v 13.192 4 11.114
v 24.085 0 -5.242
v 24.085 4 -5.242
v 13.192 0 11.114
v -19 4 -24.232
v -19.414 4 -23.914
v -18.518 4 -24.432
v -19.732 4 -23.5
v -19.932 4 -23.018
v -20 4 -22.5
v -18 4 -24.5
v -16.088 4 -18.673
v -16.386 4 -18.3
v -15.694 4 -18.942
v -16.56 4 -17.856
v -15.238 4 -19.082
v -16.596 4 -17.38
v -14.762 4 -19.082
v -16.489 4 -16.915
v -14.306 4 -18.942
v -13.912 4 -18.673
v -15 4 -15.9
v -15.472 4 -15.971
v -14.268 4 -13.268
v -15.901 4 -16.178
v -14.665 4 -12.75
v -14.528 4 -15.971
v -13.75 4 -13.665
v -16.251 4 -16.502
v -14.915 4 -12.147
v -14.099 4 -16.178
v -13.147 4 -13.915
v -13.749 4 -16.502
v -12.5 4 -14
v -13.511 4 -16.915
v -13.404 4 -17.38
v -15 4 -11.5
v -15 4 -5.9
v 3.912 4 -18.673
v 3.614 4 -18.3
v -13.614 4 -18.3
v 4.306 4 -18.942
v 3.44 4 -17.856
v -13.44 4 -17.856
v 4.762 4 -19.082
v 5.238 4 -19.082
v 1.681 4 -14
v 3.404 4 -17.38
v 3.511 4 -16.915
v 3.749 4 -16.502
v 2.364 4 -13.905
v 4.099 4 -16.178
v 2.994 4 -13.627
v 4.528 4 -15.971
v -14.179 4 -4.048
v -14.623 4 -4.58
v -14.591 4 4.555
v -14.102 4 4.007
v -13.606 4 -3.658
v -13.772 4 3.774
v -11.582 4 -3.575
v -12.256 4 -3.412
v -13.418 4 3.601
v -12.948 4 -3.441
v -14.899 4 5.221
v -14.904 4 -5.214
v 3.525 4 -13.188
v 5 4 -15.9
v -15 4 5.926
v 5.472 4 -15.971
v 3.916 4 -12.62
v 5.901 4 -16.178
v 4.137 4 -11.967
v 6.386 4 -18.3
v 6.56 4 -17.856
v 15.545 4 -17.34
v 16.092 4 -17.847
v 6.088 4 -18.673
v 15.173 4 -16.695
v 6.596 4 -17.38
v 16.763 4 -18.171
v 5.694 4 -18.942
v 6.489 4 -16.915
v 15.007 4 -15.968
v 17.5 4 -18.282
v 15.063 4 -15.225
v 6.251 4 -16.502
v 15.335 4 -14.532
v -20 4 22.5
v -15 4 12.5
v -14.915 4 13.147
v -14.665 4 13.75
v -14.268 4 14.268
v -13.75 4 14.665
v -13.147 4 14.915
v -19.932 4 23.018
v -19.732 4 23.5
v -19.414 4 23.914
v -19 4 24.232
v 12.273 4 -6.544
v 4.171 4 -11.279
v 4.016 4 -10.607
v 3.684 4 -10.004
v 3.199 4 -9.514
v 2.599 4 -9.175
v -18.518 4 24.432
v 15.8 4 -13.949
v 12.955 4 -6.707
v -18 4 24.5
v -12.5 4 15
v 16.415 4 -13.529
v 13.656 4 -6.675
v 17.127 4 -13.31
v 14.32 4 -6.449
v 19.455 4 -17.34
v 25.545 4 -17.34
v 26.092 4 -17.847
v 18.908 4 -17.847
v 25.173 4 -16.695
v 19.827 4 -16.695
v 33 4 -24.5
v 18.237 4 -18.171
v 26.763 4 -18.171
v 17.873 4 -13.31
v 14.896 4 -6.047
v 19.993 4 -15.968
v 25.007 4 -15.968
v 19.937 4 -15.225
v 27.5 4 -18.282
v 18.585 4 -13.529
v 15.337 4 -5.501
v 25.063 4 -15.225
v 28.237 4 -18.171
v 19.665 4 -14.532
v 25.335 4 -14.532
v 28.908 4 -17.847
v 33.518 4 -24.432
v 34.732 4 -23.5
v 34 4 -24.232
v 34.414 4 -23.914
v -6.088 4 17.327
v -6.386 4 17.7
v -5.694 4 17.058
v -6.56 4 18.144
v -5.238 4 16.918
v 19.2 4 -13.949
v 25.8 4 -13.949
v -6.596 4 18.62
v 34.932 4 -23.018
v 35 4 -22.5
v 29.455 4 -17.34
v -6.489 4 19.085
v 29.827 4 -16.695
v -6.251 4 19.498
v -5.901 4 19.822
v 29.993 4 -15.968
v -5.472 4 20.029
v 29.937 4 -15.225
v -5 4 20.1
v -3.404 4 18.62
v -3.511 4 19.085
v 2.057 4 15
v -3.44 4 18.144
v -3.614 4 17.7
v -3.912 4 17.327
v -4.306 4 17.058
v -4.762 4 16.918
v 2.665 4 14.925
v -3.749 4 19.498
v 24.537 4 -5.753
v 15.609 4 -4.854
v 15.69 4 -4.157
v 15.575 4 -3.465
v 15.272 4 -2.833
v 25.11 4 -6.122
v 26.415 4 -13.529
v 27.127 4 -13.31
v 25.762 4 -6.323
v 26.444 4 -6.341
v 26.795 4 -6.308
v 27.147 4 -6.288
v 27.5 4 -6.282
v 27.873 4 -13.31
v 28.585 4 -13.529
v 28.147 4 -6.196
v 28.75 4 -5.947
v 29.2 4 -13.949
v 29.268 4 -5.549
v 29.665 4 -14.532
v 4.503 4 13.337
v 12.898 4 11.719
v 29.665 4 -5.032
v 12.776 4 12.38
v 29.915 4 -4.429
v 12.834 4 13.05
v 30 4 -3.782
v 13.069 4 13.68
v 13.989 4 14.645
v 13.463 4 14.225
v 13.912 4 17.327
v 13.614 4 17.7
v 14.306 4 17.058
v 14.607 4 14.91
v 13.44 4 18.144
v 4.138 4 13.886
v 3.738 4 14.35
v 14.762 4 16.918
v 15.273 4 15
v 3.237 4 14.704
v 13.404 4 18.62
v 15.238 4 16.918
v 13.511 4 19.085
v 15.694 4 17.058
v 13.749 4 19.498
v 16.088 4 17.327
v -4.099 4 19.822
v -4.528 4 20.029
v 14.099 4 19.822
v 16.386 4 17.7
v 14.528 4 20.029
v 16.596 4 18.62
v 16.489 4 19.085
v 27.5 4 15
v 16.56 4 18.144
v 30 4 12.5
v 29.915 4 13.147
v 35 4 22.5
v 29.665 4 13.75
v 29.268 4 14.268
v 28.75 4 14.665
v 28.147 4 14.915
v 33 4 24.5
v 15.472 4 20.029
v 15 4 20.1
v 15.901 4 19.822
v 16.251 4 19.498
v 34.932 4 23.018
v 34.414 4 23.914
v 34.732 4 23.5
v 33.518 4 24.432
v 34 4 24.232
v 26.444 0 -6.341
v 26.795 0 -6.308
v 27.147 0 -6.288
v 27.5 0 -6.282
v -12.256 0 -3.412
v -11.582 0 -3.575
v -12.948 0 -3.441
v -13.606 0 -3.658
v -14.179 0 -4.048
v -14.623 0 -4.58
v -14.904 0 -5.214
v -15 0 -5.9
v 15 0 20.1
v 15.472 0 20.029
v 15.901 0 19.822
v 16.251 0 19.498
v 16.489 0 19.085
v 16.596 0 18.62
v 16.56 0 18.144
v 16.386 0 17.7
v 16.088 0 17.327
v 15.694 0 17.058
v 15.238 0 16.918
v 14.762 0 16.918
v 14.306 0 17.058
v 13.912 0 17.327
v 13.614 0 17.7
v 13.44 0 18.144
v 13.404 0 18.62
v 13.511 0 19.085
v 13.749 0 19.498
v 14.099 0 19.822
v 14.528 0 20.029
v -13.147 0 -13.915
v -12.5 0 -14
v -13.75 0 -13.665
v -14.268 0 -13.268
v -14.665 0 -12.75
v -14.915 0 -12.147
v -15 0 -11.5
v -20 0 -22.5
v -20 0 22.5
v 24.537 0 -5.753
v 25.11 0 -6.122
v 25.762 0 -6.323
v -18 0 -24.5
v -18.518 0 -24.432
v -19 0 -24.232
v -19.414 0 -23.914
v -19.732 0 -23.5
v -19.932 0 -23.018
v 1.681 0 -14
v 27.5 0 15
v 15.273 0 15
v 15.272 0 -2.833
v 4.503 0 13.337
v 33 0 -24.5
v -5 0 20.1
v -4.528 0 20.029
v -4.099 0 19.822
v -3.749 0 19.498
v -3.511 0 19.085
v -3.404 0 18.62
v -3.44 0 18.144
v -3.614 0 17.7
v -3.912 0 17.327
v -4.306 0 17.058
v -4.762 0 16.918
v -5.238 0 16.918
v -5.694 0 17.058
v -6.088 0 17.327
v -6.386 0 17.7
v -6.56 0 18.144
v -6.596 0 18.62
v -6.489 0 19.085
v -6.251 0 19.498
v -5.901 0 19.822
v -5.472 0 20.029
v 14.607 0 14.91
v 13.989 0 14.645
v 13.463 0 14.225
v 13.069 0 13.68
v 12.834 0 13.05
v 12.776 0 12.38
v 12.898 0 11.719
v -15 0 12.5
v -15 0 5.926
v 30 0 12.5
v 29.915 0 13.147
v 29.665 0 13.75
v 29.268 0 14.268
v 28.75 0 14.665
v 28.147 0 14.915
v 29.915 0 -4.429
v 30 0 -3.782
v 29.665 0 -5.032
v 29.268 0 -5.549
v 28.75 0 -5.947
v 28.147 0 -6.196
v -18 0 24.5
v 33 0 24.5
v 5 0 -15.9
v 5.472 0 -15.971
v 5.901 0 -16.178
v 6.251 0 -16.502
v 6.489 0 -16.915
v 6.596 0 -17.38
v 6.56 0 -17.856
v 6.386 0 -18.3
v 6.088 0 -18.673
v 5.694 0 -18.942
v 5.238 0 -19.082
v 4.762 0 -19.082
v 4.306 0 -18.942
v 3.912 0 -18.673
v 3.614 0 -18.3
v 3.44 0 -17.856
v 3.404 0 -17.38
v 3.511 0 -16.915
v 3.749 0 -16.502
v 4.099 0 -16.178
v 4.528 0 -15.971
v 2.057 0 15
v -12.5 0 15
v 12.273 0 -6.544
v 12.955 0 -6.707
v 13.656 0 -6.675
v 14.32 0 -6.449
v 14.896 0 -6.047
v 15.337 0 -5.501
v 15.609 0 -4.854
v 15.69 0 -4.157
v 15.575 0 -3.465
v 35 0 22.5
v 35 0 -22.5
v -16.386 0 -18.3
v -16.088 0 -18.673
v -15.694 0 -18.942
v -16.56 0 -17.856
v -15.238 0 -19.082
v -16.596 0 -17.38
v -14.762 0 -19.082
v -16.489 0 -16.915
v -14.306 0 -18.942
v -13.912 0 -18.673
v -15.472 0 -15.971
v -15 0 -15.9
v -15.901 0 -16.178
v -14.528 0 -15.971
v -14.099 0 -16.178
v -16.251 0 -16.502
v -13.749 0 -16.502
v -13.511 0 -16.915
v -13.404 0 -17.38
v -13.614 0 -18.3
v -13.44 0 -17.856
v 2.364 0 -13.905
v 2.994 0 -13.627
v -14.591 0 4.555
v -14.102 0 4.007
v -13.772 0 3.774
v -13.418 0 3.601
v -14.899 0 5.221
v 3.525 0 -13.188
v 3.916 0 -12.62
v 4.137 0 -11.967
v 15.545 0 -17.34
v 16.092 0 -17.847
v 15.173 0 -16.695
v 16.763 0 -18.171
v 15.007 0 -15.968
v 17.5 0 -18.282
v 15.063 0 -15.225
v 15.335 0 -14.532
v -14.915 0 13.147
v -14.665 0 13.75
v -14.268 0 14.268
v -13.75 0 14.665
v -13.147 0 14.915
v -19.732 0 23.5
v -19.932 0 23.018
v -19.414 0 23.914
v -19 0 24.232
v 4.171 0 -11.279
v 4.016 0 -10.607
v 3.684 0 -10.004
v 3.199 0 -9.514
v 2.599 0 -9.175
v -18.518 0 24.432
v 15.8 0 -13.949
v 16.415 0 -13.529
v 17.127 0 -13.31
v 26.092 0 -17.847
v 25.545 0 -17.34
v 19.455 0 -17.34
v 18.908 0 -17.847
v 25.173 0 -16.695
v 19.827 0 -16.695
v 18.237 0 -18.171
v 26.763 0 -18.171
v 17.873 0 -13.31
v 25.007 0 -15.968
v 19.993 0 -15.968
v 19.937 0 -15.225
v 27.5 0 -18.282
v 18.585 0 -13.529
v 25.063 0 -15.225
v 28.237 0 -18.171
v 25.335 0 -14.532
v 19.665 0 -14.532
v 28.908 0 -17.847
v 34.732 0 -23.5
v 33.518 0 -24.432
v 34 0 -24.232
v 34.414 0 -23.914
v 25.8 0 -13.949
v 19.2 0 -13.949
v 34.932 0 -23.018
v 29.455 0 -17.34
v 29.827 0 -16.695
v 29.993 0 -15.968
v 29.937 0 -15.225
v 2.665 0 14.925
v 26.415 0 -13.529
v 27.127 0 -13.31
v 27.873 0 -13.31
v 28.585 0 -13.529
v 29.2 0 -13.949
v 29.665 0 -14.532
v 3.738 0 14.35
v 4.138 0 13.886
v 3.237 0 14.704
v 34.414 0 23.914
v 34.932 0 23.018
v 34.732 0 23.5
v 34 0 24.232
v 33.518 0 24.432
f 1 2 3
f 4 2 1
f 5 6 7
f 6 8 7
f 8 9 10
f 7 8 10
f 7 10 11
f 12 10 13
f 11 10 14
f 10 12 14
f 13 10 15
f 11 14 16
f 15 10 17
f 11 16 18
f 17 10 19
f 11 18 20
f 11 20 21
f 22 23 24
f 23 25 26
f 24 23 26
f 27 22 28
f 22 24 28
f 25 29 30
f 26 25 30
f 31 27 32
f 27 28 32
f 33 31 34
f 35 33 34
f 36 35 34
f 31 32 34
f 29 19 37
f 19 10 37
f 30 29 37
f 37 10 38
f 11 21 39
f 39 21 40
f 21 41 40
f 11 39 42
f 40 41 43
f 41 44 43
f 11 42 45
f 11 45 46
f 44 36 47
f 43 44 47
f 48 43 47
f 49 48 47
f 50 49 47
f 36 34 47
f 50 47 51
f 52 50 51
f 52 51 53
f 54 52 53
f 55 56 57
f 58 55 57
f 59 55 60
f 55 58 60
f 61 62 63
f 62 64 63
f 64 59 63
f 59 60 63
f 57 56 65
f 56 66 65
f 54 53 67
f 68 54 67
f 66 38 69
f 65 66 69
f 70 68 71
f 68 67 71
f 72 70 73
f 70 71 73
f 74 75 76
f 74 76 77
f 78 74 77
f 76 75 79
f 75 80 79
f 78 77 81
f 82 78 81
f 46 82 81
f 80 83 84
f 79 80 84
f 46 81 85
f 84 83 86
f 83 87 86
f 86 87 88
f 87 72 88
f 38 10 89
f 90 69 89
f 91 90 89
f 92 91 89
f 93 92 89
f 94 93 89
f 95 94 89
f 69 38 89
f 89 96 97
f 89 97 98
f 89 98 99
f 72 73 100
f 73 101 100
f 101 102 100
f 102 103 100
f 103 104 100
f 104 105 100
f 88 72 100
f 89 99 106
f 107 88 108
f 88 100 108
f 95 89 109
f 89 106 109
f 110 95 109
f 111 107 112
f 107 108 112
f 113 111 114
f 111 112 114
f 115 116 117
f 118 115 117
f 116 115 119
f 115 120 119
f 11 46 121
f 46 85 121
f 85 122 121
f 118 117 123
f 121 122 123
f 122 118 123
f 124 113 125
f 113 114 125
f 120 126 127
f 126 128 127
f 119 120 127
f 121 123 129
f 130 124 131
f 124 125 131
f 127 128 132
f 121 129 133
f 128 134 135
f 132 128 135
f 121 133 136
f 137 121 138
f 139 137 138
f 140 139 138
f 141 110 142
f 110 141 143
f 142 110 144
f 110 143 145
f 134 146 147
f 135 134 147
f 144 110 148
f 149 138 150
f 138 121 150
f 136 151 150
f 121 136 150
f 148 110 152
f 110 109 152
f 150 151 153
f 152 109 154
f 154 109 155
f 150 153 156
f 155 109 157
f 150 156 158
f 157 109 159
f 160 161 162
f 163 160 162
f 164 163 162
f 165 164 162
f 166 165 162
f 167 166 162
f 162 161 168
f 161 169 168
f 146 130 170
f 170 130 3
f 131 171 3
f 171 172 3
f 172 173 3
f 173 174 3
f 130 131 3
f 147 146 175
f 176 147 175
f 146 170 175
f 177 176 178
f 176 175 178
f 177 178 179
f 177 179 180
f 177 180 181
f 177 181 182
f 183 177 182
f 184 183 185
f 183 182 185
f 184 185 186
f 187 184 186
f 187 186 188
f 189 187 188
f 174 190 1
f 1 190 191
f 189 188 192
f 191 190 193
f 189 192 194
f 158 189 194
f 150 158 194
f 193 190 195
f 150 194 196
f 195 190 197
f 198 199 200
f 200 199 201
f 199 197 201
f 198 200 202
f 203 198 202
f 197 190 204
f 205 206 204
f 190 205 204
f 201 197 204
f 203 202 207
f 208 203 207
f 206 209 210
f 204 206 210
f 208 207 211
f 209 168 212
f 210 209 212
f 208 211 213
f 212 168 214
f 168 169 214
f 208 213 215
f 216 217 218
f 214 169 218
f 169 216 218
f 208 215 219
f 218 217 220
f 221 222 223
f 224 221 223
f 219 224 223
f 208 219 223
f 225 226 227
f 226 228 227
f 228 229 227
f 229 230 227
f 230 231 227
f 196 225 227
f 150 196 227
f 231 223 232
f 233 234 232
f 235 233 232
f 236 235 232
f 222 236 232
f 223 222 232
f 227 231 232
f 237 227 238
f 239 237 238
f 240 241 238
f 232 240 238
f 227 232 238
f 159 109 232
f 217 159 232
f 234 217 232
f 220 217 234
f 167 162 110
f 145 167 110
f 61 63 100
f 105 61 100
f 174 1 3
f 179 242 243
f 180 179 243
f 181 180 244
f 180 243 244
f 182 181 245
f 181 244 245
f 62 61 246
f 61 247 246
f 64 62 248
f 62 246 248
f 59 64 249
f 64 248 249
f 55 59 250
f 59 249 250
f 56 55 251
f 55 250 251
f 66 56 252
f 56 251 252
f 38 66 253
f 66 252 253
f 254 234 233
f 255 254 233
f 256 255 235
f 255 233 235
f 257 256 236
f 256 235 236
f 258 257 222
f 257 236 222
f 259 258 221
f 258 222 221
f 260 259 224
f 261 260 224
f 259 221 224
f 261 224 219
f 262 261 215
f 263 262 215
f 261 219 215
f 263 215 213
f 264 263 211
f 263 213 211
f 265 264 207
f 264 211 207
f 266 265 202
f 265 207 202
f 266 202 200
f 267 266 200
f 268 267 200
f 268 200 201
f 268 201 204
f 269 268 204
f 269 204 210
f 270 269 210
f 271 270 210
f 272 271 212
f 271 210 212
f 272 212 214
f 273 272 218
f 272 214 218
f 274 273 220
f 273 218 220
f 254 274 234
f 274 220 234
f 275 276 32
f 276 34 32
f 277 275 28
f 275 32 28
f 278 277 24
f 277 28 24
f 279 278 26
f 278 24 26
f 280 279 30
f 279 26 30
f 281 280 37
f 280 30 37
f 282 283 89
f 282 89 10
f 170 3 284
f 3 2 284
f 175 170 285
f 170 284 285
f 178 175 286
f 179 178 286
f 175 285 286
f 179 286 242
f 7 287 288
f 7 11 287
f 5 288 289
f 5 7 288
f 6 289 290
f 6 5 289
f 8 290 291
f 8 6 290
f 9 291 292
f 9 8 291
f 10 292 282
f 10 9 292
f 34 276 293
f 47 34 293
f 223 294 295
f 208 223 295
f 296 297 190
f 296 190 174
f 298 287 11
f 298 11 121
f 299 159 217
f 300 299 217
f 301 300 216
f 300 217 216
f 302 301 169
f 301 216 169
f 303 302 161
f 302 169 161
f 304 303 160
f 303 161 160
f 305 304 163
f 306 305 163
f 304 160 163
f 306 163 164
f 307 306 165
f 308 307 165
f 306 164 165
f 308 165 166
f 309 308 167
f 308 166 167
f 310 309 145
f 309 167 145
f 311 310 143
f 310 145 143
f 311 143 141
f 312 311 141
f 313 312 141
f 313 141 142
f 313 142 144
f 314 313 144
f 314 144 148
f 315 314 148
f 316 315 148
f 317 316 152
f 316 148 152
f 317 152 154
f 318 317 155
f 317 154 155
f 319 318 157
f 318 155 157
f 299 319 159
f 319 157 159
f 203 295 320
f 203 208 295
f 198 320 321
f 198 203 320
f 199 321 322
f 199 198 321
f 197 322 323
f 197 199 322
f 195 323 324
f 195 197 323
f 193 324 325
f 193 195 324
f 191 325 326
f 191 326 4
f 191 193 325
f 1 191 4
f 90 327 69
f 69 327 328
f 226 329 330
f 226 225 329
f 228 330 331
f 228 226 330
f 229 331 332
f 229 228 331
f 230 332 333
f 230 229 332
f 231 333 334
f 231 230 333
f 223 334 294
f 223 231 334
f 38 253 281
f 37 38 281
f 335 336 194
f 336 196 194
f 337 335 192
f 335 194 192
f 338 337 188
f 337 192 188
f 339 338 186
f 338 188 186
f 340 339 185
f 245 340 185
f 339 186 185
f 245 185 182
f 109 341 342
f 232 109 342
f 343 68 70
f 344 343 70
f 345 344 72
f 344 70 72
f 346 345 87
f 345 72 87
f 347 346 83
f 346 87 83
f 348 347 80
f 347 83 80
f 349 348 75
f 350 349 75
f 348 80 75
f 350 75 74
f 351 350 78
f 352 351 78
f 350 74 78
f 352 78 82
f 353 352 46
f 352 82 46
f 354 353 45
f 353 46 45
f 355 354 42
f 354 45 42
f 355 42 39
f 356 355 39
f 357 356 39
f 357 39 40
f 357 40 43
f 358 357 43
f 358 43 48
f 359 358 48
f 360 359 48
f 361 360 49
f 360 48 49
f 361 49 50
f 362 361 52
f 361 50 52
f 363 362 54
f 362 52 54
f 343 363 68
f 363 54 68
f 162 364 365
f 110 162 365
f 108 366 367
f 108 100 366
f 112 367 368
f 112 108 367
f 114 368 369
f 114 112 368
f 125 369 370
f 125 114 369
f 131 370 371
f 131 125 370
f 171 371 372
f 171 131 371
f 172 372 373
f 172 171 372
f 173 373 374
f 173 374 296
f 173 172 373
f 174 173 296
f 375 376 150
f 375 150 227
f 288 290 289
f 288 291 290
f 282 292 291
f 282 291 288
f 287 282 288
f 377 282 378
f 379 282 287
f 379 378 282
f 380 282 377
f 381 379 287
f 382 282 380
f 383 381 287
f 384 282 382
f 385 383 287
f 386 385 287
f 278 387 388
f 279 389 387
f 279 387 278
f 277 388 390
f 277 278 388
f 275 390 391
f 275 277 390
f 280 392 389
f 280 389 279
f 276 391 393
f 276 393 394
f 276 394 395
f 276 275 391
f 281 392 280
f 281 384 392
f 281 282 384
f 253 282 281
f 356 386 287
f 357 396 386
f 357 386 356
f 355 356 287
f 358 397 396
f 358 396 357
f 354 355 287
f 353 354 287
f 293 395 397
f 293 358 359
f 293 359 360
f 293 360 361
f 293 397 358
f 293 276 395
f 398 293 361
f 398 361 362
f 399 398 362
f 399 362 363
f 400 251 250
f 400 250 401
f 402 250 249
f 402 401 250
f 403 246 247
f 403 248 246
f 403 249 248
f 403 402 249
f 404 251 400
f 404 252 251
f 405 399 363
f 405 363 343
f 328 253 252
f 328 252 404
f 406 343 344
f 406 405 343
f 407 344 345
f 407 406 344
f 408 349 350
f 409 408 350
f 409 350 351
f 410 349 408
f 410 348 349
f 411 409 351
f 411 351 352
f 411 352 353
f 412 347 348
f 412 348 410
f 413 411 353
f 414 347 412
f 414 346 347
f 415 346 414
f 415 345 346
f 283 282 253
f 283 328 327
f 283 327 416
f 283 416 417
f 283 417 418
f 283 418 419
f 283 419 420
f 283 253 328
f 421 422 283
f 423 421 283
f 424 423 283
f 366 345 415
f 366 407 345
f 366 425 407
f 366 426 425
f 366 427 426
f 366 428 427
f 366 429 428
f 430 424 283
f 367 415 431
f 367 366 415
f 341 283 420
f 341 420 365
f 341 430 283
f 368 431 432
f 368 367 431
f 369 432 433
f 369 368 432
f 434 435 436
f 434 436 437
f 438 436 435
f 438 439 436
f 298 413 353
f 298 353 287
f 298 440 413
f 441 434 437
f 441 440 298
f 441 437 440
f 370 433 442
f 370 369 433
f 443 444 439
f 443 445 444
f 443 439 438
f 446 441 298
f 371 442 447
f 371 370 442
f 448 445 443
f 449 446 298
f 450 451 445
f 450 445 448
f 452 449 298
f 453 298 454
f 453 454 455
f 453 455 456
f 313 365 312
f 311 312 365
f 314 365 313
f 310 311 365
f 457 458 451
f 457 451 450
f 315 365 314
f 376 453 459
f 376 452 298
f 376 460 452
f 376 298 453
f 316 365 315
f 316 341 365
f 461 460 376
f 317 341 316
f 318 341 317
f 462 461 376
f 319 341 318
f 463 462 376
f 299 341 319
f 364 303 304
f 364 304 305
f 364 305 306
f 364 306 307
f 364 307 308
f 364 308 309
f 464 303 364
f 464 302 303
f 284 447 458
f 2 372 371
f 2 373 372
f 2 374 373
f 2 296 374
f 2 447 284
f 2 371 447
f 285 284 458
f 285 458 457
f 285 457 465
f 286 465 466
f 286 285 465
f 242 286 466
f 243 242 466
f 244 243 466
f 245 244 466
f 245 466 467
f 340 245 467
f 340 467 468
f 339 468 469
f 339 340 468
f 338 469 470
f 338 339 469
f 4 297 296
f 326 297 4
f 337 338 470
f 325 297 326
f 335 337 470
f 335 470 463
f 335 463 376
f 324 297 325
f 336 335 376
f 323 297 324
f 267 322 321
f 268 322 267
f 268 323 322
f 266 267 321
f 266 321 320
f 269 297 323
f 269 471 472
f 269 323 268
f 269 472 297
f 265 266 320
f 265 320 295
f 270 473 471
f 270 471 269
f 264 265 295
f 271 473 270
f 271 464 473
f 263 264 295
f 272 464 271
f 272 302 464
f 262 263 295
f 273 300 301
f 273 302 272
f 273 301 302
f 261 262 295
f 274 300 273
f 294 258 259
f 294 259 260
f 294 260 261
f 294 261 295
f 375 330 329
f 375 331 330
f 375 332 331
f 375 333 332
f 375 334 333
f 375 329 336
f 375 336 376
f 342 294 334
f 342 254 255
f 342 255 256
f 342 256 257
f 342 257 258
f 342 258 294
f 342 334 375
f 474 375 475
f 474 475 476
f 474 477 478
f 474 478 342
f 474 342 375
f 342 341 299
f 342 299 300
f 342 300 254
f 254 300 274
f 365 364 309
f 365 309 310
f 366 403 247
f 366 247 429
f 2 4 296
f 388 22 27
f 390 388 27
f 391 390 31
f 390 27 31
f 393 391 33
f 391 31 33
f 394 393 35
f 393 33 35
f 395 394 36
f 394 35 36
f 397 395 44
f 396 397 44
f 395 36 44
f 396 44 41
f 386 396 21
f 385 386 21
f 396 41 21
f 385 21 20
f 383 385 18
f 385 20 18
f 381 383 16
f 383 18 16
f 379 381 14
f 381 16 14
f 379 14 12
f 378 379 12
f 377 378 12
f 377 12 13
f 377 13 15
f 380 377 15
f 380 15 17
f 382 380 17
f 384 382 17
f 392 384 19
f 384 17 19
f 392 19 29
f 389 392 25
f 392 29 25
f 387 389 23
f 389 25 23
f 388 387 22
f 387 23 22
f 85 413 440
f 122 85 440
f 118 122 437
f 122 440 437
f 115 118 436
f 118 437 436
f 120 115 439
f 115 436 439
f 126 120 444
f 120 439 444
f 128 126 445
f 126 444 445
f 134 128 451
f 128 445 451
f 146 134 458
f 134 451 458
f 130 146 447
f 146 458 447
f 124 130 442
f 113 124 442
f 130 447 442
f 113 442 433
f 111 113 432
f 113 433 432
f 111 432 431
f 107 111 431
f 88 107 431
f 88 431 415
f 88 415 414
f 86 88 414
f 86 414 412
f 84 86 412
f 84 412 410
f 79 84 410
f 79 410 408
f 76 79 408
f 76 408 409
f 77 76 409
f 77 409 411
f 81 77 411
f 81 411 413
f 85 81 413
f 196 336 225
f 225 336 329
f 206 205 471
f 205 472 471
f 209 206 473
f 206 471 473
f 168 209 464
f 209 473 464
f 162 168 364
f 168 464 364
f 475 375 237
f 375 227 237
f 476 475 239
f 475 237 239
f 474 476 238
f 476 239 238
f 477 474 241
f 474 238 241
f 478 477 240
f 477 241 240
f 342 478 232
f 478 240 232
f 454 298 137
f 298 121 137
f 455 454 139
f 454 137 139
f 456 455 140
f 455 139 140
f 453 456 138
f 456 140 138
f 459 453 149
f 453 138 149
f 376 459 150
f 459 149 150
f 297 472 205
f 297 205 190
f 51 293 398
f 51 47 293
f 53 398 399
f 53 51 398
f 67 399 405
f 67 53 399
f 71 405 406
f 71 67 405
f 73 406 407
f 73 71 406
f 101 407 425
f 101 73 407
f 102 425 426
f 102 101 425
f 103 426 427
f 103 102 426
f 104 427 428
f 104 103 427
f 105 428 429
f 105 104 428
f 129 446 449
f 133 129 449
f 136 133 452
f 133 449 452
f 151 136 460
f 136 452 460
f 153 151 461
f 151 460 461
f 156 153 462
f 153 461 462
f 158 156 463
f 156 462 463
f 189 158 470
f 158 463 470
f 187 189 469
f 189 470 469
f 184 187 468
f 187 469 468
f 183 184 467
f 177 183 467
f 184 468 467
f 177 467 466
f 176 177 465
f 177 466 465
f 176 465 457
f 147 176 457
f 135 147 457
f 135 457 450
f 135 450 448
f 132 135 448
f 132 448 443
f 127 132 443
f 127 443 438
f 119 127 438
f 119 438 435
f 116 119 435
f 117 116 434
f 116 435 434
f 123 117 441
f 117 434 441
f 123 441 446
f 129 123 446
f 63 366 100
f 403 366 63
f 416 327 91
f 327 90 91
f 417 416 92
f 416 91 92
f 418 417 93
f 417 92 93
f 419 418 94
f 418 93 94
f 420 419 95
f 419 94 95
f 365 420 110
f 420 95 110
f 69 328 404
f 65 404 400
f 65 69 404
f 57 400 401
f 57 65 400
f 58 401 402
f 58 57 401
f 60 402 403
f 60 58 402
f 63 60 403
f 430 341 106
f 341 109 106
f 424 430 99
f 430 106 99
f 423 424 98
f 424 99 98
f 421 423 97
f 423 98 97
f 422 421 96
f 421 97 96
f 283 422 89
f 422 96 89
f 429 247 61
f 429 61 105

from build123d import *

# Parameters (mm, degrees)
SKETCH_1_W          = 40
SKETCH_1_H          = 49
EXTRUDE_1_DEPTH     = 4
SKETCH_3_R          = 1.6
CUT_EXTRUDE_1_DEPTH = 4
SKETCH_5_W          = 15
SKETCH_5_H          = 49
SKETCH_5_R          = 2.5
EXTRUDE_2_DEPTH     = 4
CUT_EXTRUDE_2_DEPTH = 10
EXTRUDE_2_2_DEPTH   = 4
SKETCH_10_R         = 2.5
CUT_EXTRUDE_4_DEPTH = 4
FILLET_3_R          = 2.5
FILLET_4_R          = 2
SKETCH_11_R         = 2.5
CUT_EXTRUDE_5_DEPTH = 10


with BuildPart() as part:
    # 草图1 → 凸台-拉伸1 (new body)
    with BuildSketch(Plane(origin=(0, 0, 0), x_dir=(1, 0, 0), z_dir=(0, 1, 0))):
        Rectangle(SKETCH_1_W, SKETCH_1_H)
    extrude(amount=EXTRUDE_1_DEPTH)

    # 草图3 → 切除-拉伸1 (cut)
    with BuildSketch(Plane(origin=(0, 4, 0), x_dir=(1, 0, 0), z_dir=(0, 1, 0))):
        with Locations(Location((-5, -18.5, 0), (0, 0, 270))):
            Circle(SKETCH_3_R)
        with Locations(Location((15, -18.5, 0), (0, 0, 270))):
            Circle(SKETCH_3_R)
        with Locations(Location((-15, 17.5, 0), (0, 0, 270))):
            Circle(SKETCH_3_R)
        with Locations(Location((5, 17.5, 0), (0, 0, 270))):
            Circle(SKETCH_3_R)
    extrude(amount=-CUT_EXTRUDE_1_DEPTH, mode=Mode.SUBTRACT)

    # 草图5 → Extrude 2 (add)
    with BuildSketch(Plane.XZ):
        with Locations((27.5, 0)):
            Rectangle(SKETCH_5_W, SKETCH_5_H)
        with Locations(Location((27.5, -15.781639971, 0), (0, 0, 270))):
            Circle(SKETCH_5_R, mode=Mode.SUBTRACT)
    extrude(amount=-EXTRUDE_2_DEPTH)

    # 草图6 → 切除-拉伸2 (cut)
    with BuildSketch(Plane.XZ):
        with BuildLine():
            Line((30, 15), (-15, 15))
            Line((-15, 15), (-15, -14))
            Line((-15, -14), (18.168560721, -14))
            ThreePointArc((18.168560721, -14), (22.470467132, -7.722247989), (30, -6.616488581))
            Line((30, -6.616488581), (30, 15))
        make_face()
    extrude(amount=-CUT_EXTRUDE_2_DEPTH, mode=Mode.SUBTRACT)

    # 草图8 → Extrude 2 2 (add)
    with BuildSketch(Plane.XZ):
        Polygon((-18.101802033, -1.000622031), (-16.101802033, -1.790346265), (35.304944651, -22.088923087), (9.496940315, 16.662915832), (8.164977494, 18.662915832), (3.171096865, 15.337084168), (4.503059685, 13.337084168), (19.695055349, -9.474356855), (-13.898197967, 3.790346265), (-15.898197967, 4.580070499), align=None)
    extrude(amount=-EXTRUDE_2_2_DEPTH)

    # 草图10 → 切除-拉伸4 (cut)
    with BuildSketch(Plane.XZ):
        with Locations(Location((27.5, -15.781639971, 0), (0, 0, 270))):
            Circle(SKETCH_10_R)
        Polygon((35.304944651, -22.088923087), (35, -21.968511997), (35, -21.631035455), align=None)
    extrude(amount=-CUT_EXTRUDE_4_DEPTH, mode=Mode.SUBTRACT)

    # 圆角3
    fillet_3_edges = [part.edges().sort_by_distance(p)[0] for p in [
        (30, 2, -6.616488581),
        (-15, 2, -14),
        (-15, 2, 15),
        (30, 2, 15),
        (3.395588654, 2, 15),
        (10.604411346, 2, 15),
        (-15, 2, 4.225406148),
        (-15, 2, -2.225406148),
        (14.819507483, 2, -14),
        (25.000500065, 2, -6.616352192),
        (19.695055349, 2, -9.474356855),
    ]]
    fillet(fillet_3_edges, radius=FILLET_3_R)

    # 圆角4
    fillet_4_edges = [part.edges().sort_by_distance(p)[0] for p in [
        (35, 2, 24.5),
        (35, 2, -24.5),
        (-20, 2, 24.5),
        (-20, 2, -24.5),
    ]]
    fillet(fillet_4_edges, radius=FILLET_4_R)

    # 草图11 → 切除-拉伸5 (cut)
    with BuildSketch(Plane.XZ):
        with Locations(Location((17.5, -15.781639971, 0), (0, 0, 270))):
            Circle(SKETCH_11_R)
    extrude(amount=-CUT_EXTRUDE_5_DEPTH, mode=Mode.SUBTRACT)


solid = part.part
